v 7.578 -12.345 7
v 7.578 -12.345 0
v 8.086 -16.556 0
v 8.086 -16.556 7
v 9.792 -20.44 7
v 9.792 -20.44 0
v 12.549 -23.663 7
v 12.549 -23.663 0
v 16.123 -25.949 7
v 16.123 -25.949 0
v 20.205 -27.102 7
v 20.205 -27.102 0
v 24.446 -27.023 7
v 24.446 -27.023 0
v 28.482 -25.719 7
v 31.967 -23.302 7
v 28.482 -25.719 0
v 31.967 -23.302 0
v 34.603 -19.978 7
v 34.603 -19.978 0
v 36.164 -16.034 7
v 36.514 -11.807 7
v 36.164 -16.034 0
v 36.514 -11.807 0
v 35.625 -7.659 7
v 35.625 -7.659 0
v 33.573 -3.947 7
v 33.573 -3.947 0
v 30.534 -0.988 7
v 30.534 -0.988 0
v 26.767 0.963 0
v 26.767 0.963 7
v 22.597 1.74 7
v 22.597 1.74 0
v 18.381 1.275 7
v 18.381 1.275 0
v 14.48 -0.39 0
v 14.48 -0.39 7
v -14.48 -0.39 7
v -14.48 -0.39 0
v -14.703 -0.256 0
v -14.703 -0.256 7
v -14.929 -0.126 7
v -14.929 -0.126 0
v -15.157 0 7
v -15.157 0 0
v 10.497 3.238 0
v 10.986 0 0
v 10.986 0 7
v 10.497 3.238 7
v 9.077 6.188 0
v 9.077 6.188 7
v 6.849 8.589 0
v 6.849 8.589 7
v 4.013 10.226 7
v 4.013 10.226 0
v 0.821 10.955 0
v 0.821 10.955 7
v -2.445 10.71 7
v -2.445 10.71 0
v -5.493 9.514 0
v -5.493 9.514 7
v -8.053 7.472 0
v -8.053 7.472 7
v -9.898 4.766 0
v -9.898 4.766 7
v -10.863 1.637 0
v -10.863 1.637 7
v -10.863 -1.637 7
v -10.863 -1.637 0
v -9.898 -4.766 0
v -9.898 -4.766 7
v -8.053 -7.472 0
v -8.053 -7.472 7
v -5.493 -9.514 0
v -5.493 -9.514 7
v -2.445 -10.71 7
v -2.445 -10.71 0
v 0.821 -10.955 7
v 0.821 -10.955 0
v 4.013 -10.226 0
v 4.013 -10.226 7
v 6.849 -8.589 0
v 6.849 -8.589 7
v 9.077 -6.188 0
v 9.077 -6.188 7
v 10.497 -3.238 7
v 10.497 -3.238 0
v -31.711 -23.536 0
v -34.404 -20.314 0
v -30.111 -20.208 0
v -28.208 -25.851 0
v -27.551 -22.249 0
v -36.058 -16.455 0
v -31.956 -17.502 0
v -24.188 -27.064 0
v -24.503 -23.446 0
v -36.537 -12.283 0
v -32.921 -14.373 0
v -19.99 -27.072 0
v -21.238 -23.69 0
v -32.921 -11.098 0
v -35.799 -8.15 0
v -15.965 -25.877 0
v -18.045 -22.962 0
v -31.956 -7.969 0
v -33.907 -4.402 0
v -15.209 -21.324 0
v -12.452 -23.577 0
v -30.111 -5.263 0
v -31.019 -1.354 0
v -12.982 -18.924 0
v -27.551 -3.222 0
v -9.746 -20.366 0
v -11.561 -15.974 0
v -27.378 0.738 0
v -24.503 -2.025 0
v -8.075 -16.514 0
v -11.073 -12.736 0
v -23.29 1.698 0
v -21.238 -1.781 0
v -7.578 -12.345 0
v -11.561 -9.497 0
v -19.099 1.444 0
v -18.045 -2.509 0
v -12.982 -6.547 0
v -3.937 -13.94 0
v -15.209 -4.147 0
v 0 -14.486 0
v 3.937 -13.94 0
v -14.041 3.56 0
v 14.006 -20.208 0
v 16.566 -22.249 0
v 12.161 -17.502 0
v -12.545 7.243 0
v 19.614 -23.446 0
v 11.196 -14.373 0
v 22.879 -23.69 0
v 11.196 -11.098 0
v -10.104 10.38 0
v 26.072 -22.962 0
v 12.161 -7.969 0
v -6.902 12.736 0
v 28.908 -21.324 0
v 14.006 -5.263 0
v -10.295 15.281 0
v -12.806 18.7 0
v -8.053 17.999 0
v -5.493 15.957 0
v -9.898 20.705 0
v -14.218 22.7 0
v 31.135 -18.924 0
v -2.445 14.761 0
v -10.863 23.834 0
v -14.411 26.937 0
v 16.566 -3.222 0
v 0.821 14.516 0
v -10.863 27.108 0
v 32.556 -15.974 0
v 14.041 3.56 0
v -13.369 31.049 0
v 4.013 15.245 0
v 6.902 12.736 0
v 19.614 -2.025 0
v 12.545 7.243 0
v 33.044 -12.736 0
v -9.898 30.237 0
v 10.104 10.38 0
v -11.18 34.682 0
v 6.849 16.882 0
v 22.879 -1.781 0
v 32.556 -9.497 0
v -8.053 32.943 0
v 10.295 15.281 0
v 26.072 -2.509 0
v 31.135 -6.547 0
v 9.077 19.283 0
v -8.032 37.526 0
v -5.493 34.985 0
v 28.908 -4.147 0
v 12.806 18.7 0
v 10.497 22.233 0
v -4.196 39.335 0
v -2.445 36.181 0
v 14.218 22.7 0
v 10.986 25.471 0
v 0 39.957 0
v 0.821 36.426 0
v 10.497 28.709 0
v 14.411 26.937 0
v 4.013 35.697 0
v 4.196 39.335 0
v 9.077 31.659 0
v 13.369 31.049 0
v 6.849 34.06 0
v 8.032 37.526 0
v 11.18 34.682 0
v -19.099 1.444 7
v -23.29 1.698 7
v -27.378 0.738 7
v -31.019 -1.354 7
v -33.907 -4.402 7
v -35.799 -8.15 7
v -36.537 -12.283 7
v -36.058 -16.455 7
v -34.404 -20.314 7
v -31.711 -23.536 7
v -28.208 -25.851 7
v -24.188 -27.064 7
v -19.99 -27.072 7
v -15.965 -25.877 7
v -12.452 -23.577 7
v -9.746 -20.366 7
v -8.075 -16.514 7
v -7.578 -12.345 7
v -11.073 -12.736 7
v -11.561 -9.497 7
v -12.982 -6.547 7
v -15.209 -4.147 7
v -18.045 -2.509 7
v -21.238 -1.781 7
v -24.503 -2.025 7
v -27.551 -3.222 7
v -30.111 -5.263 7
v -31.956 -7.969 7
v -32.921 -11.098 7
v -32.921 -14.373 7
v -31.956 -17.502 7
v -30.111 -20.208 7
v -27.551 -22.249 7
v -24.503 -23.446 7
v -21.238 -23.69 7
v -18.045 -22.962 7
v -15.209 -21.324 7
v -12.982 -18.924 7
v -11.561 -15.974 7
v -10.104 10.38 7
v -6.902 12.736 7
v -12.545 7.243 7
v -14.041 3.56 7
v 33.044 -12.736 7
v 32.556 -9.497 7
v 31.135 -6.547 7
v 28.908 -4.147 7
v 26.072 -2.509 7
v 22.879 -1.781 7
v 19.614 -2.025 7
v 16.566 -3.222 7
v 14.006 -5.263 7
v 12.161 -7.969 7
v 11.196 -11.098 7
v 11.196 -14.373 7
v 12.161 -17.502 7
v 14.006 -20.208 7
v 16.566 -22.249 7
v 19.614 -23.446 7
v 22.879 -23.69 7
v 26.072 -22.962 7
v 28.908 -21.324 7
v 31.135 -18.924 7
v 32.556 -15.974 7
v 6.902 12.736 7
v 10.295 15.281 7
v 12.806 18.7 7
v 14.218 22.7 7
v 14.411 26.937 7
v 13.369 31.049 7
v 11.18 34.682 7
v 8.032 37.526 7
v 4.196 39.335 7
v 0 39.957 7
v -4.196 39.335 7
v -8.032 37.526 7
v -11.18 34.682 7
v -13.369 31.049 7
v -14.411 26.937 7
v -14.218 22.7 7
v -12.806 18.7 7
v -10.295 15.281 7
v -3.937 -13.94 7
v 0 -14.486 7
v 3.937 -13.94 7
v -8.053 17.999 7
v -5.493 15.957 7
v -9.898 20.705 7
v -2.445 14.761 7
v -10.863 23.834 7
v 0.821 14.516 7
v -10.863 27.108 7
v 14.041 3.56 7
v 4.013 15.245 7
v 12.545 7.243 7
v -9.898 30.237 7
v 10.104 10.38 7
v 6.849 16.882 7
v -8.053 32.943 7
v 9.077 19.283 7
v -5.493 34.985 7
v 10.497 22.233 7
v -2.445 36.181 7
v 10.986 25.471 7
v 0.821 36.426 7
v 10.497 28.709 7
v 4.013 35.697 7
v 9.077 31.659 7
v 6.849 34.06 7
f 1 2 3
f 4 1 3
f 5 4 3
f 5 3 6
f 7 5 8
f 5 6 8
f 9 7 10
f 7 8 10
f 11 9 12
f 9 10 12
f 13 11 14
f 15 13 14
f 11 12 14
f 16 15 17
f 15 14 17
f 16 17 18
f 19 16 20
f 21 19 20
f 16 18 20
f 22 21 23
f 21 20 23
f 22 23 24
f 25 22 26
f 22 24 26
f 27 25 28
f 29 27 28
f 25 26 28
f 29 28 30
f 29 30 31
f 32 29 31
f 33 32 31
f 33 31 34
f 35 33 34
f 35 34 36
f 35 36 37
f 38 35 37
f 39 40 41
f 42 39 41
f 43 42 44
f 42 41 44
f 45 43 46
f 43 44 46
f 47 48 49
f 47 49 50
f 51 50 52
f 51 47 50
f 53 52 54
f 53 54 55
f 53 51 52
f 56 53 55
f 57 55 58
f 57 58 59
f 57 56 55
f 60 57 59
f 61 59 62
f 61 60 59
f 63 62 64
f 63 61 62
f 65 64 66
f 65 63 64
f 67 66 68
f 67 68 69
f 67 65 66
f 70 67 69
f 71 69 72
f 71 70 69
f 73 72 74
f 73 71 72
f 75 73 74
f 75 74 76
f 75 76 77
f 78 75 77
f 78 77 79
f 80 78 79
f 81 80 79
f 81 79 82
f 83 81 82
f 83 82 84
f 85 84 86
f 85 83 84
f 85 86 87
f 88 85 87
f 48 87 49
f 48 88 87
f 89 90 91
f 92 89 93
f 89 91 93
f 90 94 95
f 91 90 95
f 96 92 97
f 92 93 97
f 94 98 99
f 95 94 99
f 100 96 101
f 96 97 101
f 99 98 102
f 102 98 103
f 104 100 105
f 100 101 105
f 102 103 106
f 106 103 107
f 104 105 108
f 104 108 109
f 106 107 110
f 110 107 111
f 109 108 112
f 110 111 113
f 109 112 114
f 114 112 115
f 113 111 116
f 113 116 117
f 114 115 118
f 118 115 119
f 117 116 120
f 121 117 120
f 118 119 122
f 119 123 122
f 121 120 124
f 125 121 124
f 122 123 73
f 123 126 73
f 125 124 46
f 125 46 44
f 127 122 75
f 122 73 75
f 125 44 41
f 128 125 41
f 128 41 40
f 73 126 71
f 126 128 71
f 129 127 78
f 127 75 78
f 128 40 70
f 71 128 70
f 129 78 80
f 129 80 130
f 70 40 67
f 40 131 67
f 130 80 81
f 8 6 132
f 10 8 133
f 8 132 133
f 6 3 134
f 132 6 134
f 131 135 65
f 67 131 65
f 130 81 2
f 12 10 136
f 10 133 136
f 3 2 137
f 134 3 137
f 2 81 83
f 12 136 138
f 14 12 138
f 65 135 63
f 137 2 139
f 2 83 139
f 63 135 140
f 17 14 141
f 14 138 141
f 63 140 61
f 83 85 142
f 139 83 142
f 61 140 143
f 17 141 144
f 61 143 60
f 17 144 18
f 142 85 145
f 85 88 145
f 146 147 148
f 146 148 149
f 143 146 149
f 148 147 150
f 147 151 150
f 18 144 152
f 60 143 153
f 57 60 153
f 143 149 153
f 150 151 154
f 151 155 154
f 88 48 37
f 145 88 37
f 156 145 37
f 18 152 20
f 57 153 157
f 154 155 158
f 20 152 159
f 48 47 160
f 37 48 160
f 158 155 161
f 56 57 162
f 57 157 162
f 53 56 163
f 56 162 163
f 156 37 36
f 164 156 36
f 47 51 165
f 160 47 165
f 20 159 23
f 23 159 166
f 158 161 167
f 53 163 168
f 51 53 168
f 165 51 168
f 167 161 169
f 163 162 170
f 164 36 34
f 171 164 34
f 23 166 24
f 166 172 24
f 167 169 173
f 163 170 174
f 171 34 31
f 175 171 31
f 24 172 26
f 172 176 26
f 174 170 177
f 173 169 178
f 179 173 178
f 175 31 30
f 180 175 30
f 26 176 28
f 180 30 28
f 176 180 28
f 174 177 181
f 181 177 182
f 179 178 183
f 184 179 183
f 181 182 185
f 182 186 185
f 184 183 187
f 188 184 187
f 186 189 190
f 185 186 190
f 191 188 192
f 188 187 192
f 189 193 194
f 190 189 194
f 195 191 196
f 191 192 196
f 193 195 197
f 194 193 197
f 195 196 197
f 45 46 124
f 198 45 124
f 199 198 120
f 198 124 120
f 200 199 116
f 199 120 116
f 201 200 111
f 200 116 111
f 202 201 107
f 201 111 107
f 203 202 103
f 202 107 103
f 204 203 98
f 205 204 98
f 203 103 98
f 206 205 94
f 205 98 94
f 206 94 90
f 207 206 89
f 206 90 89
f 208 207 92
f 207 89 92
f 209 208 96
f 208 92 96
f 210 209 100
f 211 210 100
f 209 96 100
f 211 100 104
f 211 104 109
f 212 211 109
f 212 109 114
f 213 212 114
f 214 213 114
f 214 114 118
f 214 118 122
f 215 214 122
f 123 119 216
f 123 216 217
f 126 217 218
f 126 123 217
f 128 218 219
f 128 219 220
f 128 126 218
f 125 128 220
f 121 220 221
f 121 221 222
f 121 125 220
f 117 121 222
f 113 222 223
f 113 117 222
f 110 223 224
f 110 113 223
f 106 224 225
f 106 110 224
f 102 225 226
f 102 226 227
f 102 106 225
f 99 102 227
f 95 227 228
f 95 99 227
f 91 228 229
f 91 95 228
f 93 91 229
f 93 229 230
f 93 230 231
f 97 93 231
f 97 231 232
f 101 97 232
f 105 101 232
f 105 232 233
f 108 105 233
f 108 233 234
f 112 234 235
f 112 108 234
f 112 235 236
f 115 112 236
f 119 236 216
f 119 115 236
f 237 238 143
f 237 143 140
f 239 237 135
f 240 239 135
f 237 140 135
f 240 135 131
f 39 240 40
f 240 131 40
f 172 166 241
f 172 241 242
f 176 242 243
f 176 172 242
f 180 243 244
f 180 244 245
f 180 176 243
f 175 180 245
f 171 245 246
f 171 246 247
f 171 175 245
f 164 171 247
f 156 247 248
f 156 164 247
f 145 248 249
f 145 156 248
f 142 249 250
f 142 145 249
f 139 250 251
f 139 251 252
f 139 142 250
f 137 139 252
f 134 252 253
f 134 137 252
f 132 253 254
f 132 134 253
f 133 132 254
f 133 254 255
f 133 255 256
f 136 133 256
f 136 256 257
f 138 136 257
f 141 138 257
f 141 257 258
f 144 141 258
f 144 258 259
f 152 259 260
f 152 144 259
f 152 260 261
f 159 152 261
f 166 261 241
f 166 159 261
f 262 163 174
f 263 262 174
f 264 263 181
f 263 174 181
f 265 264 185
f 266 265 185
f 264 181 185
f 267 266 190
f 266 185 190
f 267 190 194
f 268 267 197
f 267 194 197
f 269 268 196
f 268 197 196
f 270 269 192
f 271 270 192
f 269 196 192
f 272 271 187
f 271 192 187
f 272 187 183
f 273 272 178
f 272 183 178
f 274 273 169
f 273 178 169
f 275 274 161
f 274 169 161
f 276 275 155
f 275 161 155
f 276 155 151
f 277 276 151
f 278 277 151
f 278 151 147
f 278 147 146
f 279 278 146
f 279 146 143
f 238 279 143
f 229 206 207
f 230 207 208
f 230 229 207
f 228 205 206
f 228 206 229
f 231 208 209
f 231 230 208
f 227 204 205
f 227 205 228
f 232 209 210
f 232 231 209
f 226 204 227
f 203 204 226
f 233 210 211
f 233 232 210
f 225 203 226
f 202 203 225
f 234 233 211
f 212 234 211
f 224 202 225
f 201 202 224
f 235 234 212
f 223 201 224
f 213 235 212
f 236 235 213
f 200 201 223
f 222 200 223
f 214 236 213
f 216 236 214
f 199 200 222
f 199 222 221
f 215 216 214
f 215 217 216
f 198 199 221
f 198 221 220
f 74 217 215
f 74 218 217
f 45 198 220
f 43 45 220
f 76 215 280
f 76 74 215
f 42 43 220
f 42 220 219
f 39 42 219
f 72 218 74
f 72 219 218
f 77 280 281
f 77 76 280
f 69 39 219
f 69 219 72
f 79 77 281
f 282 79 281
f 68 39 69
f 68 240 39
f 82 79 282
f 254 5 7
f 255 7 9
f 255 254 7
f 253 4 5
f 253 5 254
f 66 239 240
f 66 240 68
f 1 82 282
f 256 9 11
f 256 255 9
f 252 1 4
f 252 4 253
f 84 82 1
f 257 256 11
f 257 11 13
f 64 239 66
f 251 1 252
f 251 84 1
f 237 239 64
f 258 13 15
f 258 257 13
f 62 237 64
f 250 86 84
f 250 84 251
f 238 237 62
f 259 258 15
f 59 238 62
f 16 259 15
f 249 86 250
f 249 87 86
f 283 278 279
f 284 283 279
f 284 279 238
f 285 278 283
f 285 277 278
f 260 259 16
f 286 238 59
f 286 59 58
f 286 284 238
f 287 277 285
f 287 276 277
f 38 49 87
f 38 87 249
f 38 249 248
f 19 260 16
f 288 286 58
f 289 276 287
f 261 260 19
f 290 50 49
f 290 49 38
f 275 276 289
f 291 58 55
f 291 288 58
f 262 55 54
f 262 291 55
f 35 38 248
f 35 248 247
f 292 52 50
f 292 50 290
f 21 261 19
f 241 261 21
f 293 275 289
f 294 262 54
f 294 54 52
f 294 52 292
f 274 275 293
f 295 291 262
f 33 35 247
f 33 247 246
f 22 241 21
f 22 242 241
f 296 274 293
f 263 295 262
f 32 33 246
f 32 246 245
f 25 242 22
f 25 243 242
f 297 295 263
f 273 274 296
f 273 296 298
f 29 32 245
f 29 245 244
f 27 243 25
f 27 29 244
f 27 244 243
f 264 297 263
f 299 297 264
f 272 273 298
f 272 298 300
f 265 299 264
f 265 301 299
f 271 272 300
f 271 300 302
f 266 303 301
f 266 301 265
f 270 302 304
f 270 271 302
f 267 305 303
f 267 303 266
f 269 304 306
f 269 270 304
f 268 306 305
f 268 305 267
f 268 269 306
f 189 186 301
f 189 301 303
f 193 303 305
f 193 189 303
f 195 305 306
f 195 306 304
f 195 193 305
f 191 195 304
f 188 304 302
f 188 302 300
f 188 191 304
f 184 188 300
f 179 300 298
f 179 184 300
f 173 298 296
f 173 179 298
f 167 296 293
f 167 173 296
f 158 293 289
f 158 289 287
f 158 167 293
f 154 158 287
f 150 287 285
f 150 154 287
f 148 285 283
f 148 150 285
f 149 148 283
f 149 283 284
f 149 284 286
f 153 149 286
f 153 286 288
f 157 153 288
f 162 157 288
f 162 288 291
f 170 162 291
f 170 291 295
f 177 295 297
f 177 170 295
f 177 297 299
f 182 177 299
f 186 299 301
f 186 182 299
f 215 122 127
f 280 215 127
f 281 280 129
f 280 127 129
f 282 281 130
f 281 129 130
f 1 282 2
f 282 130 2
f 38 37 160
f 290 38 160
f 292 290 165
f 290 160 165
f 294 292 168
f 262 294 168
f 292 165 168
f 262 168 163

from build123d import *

# Parameters (mm, degrees)
F1_R     = 10.9855
F2_DEPTH = 7


with BuildPart() as f2:
    # F1 (on Top) → F2 (new body)
    with BuildSketch(Plane.XY):
        with BuildLine():
            ThreePointArc((-14.480236, -0.390496), (-14.815783, -0.190689), (-15.156595, 0))
            ThreePointArc((-15.156595, 0), (-34.403537, -20.313797), (-7.578297, -12.345004))
            ThreePointArc((-7.578297, -12.345004), (0, -14.4855), (7.578297, -12.345004))
            ThreePointArc((7.578297, -12.345004), (34.603344, -19.97825), (14.480236, -0.390496))
            ThreePointArc((14.480236, -0.390496), (12.544811, 7.24275), (6.901938, 12.7355))
            ThreePointArc((6.901938, 12.7355), (0, 39.9565), (-6.901938, 12.7355))
            ThreePointArc((-6.901938, 12.7355), (-12.544811, 7.24275), (-14.480236, -0.390496))
        make_face()
        with Locations((-22.058533, -12.7355)):
            Circle(F1_R, mode=Mode.SUBTRACT)
        with Locations((22.058533, -12.7355)):
            Circle(F1_R, mode=Mode.SUBTRACT)
        Circle(F1_R, mode=Mode.SUBTRACT)
        with Locations((0, 25.471)):
            Circle(F1_R, mode=Mode.SUBTRACT)
    extrude(amount=F2_DEPTH)


solid = f2.part
